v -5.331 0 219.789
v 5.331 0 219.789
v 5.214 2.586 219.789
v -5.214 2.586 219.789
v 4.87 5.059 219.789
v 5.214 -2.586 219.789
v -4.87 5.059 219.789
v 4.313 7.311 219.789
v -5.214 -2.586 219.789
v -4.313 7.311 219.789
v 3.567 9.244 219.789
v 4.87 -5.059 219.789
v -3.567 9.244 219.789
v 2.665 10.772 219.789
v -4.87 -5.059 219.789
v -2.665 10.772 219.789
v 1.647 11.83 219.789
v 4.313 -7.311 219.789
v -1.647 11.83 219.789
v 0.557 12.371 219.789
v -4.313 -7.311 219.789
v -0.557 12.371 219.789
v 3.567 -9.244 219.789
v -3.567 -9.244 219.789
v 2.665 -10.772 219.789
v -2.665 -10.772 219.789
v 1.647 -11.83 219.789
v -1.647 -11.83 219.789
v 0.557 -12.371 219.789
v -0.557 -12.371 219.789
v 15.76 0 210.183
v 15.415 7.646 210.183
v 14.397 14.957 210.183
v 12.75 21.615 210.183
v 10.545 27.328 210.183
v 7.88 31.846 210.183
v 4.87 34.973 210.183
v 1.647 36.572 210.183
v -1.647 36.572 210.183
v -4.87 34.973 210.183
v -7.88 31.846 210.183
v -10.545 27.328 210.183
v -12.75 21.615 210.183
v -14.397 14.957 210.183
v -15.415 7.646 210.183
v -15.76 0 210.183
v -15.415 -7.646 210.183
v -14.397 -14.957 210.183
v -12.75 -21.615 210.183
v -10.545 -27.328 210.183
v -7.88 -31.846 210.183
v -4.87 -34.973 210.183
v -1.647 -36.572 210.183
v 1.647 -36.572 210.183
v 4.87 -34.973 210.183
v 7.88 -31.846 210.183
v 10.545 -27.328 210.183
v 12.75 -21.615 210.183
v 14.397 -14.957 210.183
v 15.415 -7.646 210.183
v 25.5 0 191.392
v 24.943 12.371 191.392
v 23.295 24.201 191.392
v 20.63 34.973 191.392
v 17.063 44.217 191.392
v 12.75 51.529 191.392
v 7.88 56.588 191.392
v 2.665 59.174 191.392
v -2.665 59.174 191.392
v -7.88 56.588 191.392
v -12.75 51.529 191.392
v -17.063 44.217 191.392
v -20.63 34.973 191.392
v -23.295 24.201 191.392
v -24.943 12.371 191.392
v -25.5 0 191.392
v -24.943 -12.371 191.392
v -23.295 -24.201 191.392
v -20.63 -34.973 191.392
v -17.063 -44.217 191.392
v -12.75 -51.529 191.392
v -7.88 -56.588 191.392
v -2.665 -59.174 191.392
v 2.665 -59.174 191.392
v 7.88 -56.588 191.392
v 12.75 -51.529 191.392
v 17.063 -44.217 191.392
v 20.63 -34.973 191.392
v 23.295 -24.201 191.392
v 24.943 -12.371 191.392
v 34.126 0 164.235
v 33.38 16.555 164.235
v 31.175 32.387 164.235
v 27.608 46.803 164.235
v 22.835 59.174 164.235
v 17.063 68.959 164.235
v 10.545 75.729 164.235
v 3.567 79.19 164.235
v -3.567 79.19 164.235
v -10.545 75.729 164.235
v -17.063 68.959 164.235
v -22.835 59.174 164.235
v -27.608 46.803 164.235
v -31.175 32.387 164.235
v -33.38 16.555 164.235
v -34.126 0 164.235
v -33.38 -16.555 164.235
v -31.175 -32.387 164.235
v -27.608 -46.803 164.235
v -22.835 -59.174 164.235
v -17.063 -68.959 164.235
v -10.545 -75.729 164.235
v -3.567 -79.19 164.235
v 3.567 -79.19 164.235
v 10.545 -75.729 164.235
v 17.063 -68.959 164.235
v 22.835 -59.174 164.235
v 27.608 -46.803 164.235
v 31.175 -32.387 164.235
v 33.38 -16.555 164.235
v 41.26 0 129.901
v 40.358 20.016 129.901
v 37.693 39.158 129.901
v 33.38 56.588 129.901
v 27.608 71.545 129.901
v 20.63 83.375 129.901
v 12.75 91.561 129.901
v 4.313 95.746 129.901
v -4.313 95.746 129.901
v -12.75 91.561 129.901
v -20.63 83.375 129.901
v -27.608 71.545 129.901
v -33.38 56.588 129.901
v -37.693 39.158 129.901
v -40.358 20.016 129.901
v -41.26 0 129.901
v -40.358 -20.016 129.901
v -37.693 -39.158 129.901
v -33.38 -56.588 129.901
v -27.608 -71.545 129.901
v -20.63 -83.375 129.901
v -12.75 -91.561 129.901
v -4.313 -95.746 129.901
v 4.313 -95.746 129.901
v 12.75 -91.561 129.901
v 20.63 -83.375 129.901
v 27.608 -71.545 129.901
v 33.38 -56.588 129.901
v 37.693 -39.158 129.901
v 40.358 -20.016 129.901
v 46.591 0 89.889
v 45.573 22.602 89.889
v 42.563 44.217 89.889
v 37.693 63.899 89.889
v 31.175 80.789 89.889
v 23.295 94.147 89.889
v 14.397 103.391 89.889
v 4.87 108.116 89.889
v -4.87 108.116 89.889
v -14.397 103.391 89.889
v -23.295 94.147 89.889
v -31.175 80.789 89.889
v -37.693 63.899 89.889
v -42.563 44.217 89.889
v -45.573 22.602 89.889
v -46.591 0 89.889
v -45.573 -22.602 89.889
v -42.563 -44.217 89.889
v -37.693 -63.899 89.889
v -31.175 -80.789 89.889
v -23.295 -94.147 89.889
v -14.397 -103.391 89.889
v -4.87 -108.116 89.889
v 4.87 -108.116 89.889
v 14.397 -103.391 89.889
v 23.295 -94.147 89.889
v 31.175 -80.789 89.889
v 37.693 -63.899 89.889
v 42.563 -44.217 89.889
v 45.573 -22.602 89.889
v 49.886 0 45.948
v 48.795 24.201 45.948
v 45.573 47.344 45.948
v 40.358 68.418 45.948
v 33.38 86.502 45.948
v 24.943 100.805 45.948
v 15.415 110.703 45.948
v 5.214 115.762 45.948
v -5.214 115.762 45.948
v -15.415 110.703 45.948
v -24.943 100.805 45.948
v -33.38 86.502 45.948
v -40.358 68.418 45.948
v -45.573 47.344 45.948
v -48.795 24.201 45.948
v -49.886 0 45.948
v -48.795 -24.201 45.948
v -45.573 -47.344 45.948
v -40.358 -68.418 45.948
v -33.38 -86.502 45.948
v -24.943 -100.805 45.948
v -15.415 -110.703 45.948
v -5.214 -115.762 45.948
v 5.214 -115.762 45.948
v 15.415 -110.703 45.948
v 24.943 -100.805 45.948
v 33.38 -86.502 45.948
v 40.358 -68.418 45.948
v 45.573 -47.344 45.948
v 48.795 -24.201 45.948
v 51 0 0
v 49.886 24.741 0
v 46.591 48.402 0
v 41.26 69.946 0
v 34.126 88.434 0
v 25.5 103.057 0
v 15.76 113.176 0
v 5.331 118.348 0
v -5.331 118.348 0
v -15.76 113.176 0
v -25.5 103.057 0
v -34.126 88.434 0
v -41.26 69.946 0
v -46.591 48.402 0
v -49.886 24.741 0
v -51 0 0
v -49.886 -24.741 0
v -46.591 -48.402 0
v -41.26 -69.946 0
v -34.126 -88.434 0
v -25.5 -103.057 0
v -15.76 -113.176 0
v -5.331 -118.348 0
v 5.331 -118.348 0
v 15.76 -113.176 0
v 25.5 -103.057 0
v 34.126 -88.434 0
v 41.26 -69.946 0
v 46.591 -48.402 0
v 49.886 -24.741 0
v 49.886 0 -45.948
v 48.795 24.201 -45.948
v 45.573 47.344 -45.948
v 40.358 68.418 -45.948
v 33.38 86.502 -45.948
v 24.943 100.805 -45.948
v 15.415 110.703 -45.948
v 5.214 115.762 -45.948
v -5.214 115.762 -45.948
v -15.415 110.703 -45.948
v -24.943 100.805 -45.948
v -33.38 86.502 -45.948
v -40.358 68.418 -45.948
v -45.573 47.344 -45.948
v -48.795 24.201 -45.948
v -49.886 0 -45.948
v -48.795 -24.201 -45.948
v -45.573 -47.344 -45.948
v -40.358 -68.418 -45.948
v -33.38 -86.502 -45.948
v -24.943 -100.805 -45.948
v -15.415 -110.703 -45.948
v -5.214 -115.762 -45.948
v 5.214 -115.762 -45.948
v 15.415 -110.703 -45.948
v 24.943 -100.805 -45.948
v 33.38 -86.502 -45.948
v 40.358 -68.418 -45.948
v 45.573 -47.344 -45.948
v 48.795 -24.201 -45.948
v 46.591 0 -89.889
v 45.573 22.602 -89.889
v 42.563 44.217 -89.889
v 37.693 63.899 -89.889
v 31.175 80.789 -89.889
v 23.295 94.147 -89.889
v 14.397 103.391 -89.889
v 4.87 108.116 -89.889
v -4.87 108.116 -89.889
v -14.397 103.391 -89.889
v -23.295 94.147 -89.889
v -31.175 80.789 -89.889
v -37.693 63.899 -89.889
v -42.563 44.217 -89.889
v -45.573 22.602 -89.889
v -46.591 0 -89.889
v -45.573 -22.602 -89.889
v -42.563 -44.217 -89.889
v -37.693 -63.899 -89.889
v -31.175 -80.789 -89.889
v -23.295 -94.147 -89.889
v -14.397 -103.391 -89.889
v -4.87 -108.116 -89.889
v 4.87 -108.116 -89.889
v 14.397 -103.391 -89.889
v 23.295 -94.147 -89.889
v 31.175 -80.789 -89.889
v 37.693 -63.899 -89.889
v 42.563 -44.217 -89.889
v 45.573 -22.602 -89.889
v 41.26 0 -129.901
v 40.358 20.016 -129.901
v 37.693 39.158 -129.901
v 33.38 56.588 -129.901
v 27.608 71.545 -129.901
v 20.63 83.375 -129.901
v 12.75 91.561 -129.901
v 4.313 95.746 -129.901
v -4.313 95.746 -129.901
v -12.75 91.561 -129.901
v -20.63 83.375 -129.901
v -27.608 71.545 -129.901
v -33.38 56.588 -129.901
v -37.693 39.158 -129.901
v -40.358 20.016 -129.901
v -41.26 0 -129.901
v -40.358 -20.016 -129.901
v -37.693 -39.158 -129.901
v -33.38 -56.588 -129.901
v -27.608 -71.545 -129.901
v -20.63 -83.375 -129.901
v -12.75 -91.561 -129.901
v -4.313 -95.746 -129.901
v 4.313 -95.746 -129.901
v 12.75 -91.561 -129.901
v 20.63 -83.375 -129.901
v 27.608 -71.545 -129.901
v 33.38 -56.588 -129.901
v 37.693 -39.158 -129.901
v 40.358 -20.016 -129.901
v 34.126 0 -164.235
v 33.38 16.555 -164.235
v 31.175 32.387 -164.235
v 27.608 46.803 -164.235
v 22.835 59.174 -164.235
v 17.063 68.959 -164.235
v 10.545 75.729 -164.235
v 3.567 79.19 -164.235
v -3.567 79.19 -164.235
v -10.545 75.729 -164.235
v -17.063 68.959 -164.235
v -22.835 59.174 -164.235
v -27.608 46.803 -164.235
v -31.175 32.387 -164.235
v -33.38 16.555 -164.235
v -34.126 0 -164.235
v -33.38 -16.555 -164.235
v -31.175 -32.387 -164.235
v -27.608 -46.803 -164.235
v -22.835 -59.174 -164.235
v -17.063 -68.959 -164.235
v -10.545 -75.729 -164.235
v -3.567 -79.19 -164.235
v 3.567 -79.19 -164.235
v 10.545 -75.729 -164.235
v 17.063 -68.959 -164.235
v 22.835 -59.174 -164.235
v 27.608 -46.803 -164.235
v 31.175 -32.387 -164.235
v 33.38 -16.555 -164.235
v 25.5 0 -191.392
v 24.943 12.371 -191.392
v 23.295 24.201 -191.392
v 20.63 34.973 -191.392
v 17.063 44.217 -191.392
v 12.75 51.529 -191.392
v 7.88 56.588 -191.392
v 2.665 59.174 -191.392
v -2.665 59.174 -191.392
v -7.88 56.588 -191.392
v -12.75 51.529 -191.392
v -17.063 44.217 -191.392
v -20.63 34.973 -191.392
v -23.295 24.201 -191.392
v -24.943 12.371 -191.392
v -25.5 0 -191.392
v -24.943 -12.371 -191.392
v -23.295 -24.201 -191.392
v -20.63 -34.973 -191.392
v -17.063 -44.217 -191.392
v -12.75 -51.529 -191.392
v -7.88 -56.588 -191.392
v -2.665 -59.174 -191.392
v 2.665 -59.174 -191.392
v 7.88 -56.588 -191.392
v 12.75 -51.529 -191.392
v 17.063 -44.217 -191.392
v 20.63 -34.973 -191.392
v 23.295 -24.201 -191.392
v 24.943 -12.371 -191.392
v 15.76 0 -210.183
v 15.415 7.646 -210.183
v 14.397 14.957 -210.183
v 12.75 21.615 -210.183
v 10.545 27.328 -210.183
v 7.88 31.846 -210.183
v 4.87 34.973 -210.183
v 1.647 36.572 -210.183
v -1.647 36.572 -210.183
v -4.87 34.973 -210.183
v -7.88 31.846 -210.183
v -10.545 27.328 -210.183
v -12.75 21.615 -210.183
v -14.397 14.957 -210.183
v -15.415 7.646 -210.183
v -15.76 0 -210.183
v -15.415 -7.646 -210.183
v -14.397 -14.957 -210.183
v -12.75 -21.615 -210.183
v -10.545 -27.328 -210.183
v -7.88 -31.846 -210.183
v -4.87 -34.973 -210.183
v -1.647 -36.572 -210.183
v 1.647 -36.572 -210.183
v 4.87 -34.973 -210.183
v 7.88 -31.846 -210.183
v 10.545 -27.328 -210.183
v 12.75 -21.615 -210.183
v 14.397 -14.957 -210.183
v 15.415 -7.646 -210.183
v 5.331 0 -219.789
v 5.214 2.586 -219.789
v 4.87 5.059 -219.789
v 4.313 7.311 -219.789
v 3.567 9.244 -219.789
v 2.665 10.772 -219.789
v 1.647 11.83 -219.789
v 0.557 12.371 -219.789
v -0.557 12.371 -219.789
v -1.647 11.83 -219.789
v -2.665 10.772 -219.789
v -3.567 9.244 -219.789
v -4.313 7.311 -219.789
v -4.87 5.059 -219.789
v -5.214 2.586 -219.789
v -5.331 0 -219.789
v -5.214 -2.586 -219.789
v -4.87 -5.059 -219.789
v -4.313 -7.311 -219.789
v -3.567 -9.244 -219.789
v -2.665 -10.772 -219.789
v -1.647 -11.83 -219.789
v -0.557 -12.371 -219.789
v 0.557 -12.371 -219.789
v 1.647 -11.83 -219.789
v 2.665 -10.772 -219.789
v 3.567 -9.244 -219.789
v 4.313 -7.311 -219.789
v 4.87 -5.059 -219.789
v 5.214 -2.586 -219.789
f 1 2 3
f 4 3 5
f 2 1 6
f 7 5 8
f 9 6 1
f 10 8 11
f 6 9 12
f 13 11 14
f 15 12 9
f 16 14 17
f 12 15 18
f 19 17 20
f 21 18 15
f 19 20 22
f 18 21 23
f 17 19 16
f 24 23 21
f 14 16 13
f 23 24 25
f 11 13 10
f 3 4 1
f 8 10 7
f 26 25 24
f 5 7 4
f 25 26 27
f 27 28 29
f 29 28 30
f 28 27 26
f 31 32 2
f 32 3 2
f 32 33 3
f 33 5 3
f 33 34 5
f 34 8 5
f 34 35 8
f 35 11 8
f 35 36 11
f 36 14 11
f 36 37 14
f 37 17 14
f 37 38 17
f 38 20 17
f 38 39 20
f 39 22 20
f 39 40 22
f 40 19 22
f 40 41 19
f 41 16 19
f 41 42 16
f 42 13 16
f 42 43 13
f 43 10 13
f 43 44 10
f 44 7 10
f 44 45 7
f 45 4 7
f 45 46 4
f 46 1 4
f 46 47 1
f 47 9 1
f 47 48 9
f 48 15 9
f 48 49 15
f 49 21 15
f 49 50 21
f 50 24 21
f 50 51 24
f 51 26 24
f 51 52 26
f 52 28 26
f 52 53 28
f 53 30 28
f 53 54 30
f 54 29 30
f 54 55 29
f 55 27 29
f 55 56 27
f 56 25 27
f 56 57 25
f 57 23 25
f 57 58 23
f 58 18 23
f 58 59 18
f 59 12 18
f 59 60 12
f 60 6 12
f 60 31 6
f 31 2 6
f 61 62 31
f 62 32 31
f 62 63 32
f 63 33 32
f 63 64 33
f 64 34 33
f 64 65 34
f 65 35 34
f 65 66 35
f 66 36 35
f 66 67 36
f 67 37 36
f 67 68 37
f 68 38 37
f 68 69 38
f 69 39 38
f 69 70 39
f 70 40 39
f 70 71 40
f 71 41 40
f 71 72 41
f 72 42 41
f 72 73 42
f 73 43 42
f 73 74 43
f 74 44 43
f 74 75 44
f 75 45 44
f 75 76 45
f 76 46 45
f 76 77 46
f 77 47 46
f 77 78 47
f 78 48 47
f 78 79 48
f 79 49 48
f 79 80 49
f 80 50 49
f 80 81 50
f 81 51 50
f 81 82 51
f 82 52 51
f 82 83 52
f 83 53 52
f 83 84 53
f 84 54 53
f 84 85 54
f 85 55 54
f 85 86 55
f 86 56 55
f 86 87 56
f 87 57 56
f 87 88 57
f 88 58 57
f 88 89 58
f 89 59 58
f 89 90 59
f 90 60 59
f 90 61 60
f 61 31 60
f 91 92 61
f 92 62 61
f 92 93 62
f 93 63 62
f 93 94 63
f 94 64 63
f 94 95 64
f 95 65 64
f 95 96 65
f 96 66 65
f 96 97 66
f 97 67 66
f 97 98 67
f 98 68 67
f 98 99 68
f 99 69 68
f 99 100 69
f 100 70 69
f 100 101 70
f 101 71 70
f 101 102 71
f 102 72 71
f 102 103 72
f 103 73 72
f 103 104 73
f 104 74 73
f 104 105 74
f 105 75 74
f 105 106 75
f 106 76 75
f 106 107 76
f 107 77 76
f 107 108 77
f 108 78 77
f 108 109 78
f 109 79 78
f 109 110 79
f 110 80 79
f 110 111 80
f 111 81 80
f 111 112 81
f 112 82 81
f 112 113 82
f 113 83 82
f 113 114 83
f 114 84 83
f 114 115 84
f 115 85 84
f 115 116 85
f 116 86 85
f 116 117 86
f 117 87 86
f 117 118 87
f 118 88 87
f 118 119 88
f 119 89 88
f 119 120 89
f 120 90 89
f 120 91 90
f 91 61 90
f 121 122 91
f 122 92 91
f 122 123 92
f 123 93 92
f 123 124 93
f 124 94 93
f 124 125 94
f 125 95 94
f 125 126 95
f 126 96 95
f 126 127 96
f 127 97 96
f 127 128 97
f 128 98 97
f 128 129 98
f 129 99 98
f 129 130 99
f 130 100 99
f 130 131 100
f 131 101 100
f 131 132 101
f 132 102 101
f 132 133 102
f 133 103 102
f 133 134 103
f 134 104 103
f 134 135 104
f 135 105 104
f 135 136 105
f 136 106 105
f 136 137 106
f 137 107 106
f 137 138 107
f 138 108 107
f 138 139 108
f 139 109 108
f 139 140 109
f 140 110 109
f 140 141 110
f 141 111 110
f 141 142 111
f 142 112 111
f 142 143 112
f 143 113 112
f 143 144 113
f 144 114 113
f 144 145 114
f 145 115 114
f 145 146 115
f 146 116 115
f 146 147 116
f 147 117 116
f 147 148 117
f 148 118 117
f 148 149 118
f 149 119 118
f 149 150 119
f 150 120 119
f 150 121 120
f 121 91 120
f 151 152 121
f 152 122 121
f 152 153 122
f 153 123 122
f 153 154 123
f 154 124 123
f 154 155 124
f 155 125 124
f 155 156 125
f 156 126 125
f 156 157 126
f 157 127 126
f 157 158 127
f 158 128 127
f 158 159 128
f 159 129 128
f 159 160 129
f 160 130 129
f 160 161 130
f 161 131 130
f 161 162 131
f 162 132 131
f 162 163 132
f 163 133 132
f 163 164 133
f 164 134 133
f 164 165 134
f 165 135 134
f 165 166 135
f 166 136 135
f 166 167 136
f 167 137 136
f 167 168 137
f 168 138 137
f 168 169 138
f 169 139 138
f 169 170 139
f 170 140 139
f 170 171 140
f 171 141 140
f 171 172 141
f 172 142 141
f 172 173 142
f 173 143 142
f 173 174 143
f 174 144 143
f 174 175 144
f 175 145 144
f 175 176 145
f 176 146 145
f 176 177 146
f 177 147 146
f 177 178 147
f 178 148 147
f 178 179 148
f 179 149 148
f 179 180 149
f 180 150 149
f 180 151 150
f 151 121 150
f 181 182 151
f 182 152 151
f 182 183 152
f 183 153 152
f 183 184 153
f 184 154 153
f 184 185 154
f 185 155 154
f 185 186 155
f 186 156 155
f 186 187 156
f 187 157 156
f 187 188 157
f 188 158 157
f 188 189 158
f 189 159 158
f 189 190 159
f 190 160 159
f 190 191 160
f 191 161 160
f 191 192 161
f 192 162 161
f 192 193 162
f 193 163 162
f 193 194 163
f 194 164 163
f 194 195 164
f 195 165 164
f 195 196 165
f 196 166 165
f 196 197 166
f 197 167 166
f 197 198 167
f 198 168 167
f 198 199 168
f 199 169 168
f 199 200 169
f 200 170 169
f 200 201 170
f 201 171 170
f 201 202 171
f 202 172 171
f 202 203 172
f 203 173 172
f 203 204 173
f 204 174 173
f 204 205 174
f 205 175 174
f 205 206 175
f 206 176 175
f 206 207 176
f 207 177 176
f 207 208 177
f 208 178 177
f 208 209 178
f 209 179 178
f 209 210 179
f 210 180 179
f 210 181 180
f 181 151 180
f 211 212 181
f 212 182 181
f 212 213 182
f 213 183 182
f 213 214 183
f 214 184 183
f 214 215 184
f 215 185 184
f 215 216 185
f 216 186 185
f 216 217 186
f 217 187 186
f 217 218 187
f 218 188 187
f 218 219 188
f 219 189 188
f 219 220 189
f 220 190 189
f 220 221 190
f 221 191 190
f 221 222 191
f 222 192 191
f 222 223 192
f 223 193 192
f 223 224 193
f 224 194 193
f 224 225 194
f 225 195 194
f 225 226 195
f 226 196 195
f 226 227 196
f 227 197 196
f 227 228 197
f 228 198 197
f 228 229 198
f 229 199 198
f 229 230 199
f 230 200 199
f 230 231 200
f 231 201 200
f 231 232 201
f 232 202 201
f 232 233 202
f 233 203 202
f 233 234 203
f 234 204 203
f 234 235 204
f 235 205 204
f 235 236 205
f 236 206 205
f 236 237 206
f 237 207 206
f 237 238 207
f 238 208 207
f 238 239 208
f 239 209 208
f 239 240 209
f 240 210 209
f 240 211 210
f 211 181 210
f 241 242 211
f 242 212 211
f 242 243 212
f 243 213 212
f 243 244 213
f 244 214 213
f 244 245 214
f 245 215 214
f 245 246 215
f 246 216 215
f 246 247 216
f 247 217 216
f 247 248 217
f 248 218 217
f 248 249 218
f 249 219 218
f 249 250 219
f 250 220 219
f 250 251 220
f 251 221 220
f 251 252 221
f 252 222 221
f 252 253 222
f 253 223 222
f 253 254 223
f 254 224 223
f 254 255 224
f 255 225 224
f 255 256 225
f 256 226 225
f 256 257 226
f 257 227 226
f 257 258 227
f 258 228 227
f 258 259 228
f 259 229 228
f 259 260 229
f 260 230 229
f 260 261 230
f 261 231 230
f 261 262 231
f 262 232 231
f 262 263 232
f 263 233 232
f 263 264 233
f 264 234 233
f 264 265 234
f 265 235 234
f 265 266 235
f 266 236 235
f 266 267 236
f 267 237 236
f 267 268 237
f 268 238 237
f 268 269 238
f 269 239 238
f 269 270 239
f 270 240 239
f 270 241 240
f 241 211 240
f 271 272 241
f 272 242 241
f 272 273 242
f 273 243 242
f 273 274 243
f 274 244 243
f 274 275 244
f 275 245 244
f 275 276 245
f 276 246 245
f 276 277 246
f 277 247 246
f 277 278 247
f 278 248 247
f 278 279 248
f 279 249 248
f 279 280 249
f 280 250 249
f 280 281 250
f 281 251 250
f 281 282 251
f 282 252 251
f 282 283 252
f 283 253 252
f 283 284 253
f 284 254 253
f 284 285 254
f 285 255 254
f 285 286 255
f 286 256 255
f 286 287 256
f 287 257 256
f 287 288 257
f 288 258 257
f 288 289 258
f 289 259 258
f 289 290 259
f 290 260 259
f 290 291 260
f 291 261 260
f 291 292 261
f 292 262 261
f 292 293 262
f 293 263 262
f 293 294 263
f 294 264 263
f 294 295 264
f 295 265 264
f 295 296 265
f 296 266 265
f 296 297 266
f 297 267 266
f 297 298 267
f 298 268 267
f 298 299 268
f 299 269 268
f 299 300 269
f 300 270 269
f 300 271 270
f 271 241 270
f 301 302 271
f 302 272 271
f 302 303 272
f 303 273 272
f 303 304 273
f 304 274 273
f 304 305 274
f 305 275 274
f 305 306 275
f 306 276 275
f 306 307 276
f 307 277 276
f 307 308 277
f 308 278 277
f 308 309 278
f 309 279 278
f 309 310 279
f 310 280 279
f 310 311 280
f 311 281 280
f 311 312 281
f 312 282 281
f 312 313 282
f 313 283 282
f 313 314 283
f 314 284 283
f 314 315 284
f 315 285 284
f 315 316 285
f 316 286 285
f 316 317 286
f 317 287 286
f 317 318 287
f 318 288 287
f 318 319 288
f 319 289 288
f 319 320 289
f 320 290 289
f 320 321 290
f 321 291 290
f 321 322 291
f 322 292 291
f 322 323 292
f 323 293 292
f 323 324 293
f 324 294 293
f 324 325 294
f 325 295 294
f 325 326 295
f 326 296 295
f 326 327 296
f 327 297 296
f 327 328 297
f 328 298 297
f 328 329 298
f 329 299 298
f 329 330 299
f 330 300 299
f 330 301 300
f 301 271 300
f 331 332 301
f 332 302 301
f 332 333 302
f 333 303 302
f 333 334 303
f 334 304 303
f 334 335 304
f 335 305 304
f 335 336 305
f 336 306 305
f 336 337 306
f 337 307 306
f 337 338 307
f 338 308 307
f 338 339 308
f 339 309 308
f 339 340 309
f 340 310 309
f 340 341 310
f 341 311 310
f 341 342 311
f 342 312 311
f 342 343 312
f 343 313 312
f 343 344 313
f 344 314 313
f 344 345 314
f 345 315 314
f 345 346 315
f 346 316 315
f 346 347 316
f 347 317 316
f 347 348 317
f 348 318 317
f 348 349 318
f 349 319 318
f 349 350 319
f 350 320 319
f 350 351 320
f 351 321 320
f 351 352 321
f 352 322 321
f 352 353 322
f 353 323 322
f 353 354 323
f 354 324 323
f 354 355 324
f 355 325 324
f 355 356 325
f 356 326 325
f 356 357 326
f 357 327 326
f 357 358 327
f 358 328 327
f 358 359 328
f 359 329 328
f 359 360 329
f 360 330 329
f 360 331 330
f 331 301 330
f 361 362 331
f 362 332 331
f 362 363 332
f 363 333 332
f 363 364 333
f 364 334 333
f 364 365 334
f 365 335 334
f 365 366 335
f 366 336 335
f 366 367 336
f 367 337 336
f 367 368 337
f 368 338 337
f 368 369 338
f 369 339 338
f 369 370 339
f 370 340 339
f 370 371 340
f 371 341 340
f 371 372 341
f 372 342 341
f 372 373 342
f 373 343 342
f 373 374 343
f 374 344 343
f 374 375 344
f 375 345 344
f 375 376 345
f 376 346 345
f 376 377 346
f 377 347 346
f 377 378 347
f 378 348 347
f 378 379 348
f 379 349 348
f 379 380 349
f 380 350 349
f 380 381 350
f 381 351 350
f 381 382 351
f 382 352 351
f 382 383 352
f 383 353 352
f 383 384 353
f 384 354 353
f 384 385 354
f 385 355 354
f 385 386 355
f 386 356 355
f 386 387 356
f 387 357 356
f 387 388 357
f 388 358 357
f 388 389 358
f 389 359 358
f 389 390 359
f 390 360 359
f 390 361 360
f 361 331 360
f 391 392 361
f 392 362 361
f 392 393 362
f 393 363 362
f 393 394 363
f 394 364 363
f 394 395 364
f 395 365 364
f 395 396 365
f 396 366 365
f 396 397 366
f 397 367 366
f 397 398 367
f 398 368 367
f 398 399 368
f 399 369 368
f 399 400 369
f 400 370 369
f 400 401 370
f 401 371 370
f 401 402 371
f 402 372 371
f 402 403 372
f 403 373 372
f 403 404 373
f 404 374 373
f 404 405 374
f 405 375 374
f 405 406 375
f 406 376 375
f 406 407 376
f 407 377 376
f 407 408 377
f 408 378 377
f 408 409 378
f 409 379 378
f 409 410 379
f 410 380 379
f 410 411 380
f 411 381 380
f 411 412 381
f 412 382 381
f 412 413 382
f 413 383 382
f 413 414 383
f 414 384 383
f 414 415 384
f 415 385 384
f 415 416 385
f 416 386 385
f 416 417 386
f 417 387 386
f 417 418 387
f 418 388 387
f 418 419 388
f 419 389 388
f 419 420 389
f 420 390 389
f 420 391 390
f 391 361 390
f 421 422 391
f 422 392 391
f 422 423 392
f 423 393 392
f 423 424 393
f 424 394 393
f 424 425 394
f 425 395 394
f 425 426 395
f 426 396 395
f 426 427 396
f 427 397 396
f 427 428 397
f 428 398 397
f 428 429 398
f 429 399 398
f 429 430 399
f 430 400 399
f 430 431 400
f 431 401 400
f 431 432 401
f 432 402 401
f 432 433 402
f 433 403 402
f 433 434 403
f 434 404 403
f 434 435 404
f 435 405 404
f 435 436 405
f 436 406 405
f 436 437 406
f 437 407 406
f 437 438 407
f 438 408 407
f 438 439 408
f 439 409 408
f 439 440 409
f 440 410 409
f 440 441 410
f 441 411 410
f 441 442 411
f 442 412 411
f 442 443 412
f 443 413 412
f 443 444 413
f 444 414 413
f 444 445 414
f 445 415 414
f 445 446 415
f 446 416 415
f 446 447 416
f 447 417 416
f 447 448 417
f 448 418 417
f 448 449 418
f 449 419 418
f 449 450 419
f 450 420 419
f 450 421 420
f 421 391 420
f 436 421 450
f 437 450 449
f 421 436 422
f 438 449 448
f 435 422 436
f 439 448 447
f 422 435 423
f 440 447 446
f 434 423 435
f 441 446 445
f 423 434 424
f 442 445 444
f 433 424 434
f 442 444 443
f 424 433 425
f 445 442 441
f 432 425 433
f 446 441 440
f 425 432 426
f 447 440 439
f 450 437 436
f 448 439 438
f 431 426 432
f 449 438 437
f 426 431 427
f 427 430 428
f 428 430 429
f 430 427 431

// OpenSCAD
// Generated by SolidPython 1.0.1 on 2020-07-29 00:46:45


scale(v = [3, 7, 13]) {
	sphere(r = 17);
}
/***********************************************
*********      SolidPython code:      **********
************************************************
 
# import packages: SolidPython
from solid import *
from solid.utils import *
from itertools import chain, combinations, permutations


class Resize:

    def __init__(self, scad_file):
        self.scad_file = scad_file
        #self.scad_file = import_scad(scad_file)
        # cone/cylinder param:
        self.r1 = 0
        self.r2 = 0
        self.h = 0
        # rectangular prism param:
        self.w = 0
        self.l = 0
        # ellipse param:
        self.r = 0

    # import OpenScad code (file name corresponds to shape)


    # classify shape + parameters
    def assign(self, param1, param2, param3):
        if self.scad_file == 'cone.scad':
            self.r1 = param1
            self.r2 = param2
            self.h = param3
        elif self.scad_file == 'cylinder.scad':
            self.r1 = param1
            self.r2 = param2
            self.h = param3
        elif self.scad_file == 'rectangularPrism.scad':
            self.h = param1
            self.l = param2
            self.w = param3
        else:
            self.r = param1
            self.h = param2

    # resize parameters
    def iterate(self):
        x = range(3, 20, 2)
        i = 1
        if self.scad_file == 'cone.scad':
            tempList = list(permutations(x, 2))
            for temp in tempList:
                param1 = temp[0]
                param2 = temp[1]
                filepath = 'produced_scad_files/' + 'cone' + str(param1) + '_' + str(param2) + '_' + '.scad'
                scad_render_to_file(cylinder(h=param1, r1=param2, r2=0), filepath)

        elif self.scad_file == 'cylinder.scad':
            tempList = list(permutations(x, 3))
            for temp in tempList:
                param1 = temp[0]
                param2 = temp[1]
                filepath = 'produced_scad_files/' + 'cylinder' + str(param1) + '_' + str(param2) + '_' + '.scad'
                scad_render_to_file(cylinder(h=param1, r1=param2, r2=param2), filepath)

        elif self.scad_file == 'rectangularPrism.scad':
            tempList = list(permutations(x, 3))
            for temp in tempList:
                param1 = temp[0]
                param2 = temp[1]
                param3 = temp[2]
                filepath = 'produced_scad_files/' + 'rectangularPrism' + str(param1) + '_' + str(param2) + '_' + str(
                    param3) + '.scad'
                scad_render_to_file(cube(size=(param1, param2, param3)), filepath)

        elif self.scad_file == 'ellipse.scad':
            tempList = list(permutations(x, 4))
            for temp in tempList:
                param1 = temp[0]
                param2 = temp[1]
                param3 = temp[2]
                param4 = temp[3]
                filepath = 'produced_scad_files/' + 'ellipse' + str(param1) + '_' + str(param2) + '_' + str(param3) + '_' + str(param4) + '.scad'
                scad_render_to_file(scale([param1, param2, param3])(sphere(r=param4)), filepath)

    def render_to_scadfile(self):
        scad_render_to_file(scad, 'example.scad') 
 
************************************************/
